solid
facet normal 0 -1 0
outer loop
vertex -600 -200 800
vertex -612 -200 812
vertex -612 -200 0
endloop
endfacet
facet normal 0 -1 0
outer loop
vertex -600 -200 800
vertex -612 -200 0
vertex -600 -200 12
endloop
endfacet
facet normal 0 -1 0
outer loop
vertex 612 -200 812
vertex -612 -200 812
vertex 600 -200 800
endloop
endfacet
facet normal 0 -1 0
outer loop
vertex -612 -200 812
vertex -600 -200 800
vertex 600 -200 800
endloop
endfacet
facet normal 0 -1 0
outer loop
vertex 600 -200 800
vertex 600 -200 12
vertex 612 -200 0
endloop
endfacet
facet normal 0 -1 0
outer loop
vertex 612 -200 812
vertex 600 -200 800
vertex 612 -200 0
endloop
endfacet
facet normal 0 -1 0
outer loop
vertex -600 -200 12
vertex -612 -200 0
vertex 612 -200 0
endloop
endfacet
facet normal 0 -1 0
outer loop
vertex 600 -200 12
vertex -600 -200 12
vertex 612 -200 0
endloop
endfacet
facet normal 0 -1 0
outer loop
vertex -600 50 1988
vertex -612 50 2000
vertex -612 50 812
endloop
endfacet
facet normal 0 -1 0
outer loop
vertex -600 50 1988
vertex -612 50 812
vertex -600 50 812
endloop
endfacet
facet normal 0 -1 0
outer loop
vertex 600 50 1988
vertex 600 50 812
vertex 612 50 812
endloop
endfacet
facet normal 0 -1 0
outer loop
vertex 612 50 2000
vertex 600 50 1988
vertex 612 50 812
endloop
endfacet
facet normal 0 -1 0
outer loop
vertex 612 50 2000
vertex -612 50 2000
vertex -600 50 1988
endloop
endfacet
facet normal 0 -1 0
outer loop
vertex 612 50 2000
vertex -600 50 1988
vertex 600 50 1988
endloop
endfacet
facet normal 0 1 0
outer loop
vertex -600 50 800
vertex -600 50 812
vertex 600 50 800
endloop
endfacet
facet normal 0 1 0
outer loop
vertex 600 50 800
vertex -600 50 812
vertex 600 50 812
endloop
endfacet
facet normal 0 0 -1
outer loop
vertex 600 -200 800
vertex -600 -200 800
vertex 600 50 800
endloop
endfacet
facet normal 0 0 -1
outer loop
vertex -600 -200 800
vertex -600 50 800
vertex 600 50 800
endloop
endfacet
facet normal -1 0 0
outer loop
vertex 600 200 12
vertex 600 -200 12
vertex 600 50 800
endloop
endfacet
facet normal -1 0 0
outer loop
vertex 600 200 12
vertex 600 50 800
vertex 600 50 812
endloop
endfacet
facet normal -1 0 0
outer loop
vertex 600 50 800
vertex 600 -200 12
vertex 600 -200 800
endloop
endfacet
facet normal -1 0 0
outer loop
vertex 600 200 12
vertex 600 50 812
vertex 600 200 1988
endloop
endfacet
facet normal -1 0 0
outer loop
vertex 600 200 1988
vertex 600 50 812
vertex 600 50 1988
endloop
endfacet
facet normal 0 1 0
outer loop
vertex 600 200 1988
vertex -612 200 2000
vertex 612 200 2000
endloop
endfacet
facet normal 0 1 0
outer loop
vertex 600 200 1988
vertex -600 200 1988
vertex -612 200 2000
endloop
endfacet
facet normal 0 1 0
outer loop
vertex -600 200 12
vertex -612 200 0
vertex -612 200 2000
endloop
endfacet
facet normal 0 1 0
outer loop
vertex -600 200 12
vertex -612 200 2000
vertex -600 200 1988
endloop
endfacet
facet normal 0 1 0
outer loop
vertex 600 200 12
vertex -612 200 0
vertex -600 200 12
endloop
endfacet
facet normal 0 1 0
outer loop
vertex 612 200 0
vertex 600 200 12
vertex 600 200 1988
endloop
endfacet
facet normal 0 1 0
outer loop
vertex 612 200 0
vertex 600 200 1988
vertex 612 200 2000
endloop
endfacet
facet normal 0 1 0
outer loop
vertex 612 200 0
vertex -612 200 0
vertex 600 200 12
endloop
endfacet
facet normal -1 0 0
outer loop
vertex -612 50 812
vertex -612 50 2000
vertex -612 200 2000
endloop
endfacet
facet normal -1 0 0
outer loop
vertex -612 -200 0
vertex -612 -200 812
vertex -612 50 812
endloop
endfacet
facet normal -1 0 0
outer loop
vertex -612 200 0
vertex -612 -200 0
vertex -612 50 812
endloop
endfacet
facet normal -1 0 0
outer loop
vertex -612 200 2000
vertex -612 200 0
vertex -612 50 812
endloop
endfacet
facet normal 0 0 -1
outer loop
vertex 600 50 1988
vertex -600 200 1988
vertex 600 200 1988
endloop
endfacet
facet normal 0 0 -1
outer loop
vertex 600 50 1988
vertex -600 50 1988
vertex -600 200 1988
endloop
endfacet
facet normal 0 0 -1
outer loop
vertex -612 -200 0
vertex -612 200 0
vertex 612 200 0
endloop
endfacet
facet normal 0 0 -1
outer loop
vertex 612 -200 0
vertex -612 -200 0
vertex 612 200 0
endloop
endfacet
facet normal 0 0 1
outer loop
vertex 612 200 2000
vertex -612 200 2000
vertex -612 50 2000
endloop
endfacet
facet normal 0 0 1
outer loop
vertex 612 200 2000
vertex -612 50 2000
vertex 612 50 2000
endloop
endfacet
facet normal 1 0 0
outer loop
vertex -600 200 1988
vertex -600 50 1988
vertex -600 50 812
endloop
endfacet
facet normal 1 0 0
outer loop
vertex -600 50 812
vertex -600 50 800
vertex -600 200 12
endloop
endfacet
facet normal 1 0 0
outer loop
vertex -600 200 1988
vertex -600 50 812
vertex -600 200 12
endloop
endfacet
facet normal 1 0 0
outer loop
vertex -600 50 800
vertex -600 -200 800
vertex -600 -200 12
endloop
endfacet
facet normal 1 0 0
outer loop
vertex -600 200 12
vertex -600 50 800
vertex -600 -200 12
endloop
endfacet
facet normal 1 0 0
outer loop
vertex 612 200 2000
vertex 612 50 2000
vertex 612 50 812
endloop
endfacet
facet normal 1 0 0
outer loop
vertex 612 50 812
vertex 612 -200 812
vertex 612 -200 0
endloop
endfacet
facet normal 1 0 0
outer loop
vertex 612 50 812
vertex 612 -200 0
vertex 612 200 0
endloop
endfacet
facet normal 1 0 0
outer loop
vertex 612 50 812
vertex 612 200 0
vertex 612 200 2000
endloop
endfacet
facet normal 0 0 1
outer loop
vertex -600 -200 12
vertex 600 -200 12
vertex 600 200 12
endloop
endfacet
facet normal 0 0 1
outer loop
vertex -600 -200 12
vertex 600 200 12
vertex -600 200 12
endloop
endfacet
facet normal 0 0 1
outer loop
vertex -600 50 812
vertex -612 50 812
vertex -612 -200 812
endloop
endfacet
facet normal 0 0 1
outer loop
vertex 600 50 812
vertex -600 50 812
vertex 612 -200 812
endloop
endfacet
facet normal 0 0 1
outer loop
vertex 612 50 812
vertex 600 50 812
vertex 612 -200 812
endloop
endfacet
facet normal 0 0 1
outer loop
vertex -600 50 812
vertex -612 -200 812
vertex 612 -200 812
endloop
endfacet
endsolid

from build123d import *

# Parameters (mm, degrees)
F0_W     = 1224
F0_H     = 400
F1_DEPTH = 2000
F2_W     = 1224
F2_H     = 1188
F3_DEPTH = 250
F4_T     = -12


# Not quite as in the source:
# - a shell that OpenCascade refuses in one call is made with other operations: the cavity is built on its own and cut out


with BuildPart() as f1:
    # F0 (on Top) → F1 (new body)
    with BuildSketch(Plane.XY):
        Rectangle(F0_W, F0_H)
    extrude(amount=F1_DEPTH)

    # F2 (on face) → F3 (cut)
    with BuildSketch(Plane.XZ.offset(200)):
        with Locations((0, 1406)):
            Rectangle(F2_W, F2_H)
    extrude(amount=-F3_DEPTH, mode=Mode.SUBTRACT)

    # F4: a shell. OpenCascade refuses it in one call, so the cavity is built on its own and cut out:
    # the body offset inwards by the wall thickness, plus a prism from it out through each open face.
    f4_core = offset(f1.part, amount=F4_T, kind=Kind.INTERSECTION, mode=Mode.PRIVATE)
    f4_exits = [f4_core.faces().sort_by_distance(p)[0] for p in [
        (0, 188, 1000),
        (0, 62, 1394),
        (0, -188, 406),
    ]]
    add(f4_core, mode=Mode.SUBTRACT)
    extrude(f4_exits, amount=-F4_T, mode=Mode.SUBTRACT)


solid = f1.part
